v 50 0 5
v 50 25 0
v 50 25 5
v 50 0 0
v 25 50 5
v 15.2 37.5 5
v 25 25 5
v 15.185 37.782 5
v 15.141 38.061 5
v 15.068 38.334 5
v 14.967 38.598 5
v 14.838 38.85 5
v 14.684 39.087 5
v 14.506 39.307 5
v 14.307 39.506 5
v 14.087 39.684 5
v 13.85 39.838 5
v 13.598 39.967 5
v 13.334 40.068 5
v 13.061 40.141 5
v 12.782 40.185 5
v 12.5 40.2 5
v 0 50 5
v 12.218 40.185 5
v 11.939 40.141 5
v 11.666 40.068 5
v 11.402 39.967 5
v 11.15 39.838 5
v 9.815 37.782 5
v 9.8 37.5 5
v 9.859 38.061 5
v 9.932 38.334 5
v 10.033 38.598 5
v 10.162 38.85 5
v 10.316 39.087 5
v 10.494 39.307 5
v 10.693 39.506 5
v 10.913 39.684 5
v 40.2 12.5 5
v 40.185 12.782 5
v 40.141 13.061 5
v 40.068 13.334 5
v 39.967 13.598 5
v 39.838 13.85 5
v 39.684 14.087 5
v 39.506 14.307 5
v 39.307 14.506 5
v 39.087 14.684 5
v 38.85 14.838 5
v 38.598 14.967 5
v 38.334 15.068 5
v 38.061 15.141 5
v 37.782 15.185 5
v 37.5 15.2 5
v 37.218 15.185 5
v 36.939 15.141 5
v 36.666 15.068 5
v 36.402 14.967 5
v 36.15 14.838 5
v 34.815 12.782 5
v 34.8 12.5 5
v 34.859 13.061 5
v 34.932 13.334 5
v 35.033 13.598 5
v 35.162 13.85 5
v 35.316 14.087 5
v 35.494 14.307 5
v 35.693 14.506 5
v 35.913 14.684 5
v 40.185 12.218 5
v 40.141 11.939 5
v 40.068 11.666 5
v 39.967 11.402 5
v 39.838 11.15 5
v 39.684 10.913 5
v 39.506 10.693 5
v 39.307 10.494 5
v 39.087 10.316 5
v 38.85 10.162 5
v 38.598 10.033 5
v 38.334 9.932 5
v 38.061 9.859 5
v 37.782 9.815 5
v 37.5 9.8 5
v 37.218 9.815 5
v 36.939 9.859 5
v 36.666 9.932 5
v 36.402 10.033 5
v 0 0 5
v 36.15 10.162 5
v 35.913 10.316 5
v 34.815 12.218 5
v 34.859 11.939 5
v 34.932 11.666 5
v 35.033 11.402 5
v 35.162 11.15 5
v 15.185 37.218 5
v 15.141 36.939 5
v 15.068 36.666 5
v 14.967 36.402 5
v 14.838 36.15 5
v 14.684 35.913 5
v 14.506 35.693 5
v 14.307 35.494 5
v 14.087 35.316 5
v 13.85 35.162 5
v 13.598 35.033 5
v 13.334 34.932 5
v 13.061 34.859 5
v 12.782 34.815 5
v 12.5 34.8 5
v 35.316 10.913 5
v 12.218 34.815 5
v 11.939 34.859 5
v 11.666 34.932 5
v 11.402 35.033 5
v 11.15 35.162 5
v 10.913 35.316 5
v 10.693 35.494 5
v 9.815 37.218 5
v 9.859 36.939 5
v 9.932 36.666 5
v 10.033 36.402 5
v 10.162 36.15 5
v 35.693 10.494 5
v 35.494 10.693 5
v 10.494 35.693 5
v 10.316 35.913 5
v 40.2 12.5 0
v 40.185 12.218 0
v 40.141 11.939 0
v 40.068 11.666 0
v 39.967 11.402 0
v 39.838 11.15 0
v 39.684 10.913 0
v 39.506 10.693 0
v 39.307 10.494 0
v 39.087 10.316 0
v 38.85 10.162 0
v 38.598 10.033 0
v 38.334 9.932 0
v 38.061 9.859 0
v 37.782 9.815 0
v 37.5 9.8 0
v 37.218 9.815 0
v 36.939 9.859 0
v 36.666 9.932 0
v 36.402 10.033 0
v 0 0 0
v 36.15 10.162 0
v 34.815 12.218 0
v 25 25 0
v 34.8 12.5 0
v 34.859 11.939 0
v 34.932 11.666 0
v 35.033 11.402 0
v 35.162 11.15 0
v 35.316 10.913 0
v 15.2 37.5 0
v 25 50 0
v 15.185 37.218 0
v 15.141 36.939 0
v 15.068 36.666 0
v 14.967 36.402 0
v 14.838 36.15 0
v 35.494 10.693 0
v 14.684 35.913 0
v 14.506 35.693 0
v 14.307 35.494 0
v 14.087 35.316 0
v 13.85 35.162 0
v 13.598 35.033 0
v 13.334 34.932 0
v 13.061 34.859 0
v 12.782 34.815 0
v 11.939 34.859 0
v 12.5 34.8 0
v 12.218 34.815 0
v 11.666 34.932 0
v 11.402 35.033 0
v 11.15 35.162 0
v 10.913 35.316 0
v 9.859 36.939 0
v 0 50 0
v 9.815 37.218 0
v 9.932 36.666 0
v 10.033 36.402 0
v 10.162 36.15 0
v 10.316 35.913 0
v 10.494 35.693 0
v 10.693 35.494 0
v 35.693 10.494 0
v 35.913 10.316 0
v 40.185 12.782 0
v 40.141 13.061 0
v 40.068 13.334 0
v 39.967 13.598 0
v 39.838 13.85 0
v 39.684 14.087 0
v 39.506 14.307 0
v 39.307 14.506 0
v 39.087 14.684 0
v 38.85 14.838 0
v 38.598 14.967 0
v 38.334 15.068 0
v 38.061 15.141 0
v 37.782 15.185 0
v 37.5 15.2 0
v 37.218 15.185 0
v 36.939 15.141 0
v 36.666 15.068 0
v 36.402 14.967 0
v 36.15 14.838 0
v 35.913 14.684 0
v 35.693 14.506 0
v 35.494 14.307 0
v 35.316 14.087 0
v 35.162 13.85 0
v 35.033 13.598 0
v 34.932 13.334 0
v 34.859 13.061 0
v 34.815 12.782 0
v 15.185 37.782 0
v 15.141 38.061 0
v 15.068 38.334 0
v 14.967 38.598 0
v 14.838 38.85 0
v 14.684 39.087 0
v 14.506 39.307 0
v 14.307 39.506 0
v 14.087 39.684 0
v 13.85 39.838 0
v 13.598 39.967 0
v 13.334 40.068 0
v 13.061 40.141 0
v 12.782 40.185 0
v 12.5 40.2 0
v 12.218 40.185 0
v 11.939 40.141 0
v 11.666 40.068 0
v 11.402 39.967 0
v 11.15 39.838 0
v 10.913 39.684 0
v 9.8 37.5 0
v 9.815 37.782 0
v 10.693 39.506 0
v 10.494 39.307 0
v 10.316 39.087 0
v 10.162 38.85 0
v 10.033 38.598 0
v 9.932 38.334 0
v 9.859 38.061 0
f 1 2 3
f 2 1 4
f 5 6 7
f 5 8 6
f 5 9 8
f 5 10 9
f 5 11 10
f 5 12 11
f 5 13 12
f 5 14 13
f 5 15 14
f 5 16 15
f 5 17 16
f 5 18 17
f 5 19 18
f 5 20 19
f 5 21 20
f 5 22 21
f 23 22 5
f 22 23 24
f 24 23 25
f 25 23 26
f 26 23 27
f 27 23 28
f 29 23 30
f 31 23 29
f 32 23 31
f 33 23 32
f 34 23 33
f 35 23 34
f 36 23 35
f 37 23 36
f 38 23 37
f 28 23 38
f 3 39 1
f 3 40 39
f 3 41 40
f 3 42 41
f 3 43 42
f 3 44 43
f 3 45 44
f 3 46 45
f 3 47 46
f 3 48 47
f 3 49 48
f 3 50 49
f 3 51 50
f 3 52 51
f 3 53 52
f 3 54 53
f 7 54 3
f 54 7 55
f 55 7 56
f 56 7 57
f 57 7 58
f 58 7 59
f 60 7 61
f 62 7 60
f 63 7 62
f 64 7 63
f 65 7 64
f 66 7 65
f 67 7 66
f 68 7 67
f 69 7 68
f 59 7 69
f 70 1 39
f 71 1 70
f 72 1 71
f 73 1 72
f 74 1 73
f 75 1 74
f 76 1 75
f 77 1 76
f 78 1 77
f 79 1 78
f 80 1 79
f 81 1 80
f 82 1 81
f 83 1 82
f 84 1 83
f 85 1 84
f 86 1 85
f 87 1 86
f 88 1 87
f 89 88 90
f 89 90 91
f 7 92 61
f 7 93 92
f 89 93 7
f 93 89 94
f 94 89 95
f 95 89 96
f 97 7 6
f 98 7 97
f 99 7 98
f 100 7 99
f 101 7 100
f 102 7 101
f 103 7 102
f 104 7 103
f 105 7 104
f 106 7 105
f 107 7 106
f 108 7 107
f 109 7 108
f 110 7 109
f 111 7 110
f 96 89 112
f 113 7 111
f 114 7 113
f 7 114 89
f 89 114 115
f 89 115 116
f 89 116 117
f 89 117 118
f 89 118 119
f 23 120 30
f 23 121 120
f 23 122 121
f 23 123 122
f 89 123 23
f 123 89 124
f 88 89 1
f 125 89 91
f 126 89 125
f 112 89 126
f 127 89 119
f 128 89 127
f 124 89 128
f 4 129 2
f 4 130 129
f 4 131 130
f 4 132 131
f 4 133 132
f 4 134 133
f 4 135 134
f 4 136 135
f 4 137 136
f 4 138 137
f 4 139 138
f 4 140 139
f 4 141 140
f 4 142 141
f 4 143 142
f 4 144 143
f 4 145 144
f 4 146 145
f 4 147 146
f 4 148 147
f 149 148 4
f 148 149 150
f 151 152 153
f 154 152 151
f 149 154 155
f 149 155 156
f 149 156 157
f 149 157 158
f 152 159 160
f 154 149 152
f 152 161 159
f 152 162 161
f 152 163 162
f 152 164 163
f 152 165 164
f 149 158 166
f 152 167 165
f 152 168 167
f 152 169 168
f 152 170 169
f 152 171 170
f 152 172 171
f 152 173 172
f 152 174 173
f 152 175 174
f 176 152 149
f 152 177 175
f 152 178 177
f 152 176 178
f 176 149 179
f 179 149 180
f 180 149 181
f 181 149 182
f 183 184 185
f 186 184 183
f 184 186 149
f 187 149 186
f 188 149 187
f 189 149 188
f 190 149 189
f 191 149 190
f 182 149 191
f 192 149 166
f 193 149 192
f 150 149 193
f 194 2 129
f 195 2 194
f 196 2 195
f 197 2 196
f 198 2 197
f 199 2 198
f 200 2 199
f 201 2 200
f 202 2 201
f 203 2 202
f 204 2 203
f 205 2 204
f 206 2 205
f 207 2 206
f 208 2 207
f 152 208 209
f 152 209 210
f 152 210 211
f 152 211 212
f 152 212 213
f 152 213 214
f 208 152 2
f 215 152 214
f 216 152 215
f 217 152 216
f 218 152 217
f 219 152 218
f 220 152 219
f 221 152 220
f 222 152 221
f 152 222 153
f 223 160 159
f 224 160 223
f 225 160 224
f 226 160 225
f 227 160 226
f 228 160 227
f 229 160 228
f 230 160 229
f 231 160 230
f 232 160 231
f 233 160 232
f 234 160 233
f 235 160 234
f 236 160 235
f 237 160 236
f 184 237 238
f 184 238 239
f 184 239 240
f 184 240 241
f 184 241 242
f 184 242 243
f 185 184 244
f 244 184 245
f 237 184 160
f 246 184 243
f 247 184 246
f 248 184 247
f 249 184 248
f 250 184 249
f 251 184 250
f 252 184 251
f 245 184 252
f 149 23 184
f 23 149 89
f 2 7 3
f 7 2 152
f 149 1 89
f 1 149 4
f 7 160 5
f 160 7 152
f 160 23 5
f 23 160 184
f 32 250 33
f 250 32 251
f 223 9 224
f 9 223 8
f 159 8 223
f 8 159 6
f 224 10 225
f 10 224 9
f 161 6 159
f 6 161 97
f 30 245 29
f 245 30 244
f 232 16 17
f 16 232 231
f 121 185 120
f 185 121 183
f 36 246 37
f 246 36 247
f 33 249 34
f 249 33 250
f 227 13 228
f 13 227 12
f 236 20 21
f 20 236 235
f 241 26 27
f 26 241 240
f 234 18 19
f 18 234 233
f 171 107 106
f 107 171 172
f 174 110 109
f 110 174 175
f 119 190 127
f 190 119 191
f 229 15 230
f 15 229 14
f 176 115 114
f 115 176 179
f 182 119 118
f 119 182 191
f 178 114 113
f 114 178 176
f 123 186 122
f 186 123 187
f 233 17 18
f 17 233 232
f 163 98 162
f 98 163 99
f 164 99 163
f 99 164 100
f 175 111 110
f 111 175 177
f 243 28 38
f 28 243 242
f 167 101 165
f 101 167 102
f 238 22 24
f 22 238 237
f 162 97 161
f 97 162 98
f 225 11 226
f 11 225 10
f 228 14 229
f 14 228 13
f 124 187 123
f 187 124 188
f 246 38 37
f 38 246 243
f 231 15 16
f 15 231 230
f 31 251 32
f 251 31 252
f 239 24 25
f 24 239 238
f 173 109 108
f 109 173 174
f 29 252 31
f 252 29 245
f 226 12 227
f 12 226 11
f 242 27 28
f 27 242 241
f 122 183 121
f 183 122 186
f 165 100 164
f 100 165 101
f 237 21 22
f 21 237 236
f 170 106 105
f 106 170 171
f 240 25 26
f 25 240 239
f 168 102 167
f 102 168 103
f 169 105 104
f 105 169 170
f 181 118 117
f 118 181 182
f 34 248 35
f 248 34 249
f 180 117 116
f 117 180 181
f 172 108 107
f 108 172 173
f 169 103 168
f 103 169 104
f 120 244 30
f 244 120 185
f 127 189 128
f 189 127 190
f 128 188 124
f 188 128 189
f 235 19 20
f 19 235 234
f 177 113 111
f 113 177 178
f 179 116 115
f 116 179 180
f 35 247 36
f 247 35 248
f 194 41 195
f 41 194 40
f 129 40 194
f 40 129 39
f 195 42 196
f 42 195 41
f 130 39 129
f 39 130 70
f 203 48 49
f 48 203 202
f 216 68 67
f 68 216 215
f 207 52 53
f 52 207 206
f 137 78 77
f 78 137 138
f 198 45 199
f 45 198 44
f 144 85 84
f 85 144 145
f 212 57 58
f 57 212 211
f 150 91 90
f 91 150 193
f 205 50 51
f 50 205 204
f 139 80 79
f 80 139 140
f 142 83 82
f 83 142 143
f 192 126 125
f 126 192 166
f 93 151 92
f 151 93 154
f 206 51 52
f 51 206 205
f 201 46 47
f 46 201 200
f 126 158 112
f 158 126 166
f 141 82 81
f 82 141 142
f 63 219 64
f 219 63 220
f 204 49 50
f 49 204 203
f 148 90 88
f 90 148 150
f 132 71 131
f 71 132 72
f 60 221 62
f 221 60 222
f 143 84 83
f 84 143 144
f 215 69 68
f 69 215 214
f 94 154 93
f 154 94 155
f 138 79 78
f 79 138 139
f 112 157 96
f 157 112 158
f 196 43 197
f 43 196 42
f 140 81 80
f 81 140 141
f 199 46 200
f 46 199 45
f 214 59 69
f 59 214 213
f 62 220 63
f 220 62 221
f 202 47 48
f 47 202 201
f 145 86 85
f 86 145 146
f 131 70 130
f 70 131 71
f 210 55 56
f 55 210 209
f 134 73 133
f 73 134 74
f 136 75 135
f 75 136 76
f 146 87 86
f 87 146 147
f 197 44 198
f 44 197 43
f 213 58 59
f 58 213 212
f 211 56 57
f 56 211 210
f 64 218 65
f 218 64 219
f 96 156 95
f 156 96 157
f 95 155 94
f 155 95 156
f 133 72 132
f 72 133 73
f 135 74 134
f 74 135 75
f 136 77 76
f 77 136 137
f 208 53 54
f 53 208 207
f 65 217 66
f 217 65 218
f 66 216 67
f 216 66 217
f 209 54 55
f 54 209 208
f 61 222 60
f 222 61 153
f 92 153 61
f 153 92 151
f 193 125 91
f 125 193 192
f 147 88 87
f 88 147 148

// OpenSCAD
// Flat 90-degree corner plate.
$fn = 60;
eps = 0.02;
arm = 50;
width = 25;
plate_t = 5;
difference() {
    union() { cube([arm, width, plate_t]); cube([width, arm, plate_t]); }
    for (p = [[width / 2, arm - width / 2], [arm - width / 2, width / 2]])
        translate([p[0], p[1], -eps]) cylinder(d = 5.4, h = plate_t + 2 * eps);
}
